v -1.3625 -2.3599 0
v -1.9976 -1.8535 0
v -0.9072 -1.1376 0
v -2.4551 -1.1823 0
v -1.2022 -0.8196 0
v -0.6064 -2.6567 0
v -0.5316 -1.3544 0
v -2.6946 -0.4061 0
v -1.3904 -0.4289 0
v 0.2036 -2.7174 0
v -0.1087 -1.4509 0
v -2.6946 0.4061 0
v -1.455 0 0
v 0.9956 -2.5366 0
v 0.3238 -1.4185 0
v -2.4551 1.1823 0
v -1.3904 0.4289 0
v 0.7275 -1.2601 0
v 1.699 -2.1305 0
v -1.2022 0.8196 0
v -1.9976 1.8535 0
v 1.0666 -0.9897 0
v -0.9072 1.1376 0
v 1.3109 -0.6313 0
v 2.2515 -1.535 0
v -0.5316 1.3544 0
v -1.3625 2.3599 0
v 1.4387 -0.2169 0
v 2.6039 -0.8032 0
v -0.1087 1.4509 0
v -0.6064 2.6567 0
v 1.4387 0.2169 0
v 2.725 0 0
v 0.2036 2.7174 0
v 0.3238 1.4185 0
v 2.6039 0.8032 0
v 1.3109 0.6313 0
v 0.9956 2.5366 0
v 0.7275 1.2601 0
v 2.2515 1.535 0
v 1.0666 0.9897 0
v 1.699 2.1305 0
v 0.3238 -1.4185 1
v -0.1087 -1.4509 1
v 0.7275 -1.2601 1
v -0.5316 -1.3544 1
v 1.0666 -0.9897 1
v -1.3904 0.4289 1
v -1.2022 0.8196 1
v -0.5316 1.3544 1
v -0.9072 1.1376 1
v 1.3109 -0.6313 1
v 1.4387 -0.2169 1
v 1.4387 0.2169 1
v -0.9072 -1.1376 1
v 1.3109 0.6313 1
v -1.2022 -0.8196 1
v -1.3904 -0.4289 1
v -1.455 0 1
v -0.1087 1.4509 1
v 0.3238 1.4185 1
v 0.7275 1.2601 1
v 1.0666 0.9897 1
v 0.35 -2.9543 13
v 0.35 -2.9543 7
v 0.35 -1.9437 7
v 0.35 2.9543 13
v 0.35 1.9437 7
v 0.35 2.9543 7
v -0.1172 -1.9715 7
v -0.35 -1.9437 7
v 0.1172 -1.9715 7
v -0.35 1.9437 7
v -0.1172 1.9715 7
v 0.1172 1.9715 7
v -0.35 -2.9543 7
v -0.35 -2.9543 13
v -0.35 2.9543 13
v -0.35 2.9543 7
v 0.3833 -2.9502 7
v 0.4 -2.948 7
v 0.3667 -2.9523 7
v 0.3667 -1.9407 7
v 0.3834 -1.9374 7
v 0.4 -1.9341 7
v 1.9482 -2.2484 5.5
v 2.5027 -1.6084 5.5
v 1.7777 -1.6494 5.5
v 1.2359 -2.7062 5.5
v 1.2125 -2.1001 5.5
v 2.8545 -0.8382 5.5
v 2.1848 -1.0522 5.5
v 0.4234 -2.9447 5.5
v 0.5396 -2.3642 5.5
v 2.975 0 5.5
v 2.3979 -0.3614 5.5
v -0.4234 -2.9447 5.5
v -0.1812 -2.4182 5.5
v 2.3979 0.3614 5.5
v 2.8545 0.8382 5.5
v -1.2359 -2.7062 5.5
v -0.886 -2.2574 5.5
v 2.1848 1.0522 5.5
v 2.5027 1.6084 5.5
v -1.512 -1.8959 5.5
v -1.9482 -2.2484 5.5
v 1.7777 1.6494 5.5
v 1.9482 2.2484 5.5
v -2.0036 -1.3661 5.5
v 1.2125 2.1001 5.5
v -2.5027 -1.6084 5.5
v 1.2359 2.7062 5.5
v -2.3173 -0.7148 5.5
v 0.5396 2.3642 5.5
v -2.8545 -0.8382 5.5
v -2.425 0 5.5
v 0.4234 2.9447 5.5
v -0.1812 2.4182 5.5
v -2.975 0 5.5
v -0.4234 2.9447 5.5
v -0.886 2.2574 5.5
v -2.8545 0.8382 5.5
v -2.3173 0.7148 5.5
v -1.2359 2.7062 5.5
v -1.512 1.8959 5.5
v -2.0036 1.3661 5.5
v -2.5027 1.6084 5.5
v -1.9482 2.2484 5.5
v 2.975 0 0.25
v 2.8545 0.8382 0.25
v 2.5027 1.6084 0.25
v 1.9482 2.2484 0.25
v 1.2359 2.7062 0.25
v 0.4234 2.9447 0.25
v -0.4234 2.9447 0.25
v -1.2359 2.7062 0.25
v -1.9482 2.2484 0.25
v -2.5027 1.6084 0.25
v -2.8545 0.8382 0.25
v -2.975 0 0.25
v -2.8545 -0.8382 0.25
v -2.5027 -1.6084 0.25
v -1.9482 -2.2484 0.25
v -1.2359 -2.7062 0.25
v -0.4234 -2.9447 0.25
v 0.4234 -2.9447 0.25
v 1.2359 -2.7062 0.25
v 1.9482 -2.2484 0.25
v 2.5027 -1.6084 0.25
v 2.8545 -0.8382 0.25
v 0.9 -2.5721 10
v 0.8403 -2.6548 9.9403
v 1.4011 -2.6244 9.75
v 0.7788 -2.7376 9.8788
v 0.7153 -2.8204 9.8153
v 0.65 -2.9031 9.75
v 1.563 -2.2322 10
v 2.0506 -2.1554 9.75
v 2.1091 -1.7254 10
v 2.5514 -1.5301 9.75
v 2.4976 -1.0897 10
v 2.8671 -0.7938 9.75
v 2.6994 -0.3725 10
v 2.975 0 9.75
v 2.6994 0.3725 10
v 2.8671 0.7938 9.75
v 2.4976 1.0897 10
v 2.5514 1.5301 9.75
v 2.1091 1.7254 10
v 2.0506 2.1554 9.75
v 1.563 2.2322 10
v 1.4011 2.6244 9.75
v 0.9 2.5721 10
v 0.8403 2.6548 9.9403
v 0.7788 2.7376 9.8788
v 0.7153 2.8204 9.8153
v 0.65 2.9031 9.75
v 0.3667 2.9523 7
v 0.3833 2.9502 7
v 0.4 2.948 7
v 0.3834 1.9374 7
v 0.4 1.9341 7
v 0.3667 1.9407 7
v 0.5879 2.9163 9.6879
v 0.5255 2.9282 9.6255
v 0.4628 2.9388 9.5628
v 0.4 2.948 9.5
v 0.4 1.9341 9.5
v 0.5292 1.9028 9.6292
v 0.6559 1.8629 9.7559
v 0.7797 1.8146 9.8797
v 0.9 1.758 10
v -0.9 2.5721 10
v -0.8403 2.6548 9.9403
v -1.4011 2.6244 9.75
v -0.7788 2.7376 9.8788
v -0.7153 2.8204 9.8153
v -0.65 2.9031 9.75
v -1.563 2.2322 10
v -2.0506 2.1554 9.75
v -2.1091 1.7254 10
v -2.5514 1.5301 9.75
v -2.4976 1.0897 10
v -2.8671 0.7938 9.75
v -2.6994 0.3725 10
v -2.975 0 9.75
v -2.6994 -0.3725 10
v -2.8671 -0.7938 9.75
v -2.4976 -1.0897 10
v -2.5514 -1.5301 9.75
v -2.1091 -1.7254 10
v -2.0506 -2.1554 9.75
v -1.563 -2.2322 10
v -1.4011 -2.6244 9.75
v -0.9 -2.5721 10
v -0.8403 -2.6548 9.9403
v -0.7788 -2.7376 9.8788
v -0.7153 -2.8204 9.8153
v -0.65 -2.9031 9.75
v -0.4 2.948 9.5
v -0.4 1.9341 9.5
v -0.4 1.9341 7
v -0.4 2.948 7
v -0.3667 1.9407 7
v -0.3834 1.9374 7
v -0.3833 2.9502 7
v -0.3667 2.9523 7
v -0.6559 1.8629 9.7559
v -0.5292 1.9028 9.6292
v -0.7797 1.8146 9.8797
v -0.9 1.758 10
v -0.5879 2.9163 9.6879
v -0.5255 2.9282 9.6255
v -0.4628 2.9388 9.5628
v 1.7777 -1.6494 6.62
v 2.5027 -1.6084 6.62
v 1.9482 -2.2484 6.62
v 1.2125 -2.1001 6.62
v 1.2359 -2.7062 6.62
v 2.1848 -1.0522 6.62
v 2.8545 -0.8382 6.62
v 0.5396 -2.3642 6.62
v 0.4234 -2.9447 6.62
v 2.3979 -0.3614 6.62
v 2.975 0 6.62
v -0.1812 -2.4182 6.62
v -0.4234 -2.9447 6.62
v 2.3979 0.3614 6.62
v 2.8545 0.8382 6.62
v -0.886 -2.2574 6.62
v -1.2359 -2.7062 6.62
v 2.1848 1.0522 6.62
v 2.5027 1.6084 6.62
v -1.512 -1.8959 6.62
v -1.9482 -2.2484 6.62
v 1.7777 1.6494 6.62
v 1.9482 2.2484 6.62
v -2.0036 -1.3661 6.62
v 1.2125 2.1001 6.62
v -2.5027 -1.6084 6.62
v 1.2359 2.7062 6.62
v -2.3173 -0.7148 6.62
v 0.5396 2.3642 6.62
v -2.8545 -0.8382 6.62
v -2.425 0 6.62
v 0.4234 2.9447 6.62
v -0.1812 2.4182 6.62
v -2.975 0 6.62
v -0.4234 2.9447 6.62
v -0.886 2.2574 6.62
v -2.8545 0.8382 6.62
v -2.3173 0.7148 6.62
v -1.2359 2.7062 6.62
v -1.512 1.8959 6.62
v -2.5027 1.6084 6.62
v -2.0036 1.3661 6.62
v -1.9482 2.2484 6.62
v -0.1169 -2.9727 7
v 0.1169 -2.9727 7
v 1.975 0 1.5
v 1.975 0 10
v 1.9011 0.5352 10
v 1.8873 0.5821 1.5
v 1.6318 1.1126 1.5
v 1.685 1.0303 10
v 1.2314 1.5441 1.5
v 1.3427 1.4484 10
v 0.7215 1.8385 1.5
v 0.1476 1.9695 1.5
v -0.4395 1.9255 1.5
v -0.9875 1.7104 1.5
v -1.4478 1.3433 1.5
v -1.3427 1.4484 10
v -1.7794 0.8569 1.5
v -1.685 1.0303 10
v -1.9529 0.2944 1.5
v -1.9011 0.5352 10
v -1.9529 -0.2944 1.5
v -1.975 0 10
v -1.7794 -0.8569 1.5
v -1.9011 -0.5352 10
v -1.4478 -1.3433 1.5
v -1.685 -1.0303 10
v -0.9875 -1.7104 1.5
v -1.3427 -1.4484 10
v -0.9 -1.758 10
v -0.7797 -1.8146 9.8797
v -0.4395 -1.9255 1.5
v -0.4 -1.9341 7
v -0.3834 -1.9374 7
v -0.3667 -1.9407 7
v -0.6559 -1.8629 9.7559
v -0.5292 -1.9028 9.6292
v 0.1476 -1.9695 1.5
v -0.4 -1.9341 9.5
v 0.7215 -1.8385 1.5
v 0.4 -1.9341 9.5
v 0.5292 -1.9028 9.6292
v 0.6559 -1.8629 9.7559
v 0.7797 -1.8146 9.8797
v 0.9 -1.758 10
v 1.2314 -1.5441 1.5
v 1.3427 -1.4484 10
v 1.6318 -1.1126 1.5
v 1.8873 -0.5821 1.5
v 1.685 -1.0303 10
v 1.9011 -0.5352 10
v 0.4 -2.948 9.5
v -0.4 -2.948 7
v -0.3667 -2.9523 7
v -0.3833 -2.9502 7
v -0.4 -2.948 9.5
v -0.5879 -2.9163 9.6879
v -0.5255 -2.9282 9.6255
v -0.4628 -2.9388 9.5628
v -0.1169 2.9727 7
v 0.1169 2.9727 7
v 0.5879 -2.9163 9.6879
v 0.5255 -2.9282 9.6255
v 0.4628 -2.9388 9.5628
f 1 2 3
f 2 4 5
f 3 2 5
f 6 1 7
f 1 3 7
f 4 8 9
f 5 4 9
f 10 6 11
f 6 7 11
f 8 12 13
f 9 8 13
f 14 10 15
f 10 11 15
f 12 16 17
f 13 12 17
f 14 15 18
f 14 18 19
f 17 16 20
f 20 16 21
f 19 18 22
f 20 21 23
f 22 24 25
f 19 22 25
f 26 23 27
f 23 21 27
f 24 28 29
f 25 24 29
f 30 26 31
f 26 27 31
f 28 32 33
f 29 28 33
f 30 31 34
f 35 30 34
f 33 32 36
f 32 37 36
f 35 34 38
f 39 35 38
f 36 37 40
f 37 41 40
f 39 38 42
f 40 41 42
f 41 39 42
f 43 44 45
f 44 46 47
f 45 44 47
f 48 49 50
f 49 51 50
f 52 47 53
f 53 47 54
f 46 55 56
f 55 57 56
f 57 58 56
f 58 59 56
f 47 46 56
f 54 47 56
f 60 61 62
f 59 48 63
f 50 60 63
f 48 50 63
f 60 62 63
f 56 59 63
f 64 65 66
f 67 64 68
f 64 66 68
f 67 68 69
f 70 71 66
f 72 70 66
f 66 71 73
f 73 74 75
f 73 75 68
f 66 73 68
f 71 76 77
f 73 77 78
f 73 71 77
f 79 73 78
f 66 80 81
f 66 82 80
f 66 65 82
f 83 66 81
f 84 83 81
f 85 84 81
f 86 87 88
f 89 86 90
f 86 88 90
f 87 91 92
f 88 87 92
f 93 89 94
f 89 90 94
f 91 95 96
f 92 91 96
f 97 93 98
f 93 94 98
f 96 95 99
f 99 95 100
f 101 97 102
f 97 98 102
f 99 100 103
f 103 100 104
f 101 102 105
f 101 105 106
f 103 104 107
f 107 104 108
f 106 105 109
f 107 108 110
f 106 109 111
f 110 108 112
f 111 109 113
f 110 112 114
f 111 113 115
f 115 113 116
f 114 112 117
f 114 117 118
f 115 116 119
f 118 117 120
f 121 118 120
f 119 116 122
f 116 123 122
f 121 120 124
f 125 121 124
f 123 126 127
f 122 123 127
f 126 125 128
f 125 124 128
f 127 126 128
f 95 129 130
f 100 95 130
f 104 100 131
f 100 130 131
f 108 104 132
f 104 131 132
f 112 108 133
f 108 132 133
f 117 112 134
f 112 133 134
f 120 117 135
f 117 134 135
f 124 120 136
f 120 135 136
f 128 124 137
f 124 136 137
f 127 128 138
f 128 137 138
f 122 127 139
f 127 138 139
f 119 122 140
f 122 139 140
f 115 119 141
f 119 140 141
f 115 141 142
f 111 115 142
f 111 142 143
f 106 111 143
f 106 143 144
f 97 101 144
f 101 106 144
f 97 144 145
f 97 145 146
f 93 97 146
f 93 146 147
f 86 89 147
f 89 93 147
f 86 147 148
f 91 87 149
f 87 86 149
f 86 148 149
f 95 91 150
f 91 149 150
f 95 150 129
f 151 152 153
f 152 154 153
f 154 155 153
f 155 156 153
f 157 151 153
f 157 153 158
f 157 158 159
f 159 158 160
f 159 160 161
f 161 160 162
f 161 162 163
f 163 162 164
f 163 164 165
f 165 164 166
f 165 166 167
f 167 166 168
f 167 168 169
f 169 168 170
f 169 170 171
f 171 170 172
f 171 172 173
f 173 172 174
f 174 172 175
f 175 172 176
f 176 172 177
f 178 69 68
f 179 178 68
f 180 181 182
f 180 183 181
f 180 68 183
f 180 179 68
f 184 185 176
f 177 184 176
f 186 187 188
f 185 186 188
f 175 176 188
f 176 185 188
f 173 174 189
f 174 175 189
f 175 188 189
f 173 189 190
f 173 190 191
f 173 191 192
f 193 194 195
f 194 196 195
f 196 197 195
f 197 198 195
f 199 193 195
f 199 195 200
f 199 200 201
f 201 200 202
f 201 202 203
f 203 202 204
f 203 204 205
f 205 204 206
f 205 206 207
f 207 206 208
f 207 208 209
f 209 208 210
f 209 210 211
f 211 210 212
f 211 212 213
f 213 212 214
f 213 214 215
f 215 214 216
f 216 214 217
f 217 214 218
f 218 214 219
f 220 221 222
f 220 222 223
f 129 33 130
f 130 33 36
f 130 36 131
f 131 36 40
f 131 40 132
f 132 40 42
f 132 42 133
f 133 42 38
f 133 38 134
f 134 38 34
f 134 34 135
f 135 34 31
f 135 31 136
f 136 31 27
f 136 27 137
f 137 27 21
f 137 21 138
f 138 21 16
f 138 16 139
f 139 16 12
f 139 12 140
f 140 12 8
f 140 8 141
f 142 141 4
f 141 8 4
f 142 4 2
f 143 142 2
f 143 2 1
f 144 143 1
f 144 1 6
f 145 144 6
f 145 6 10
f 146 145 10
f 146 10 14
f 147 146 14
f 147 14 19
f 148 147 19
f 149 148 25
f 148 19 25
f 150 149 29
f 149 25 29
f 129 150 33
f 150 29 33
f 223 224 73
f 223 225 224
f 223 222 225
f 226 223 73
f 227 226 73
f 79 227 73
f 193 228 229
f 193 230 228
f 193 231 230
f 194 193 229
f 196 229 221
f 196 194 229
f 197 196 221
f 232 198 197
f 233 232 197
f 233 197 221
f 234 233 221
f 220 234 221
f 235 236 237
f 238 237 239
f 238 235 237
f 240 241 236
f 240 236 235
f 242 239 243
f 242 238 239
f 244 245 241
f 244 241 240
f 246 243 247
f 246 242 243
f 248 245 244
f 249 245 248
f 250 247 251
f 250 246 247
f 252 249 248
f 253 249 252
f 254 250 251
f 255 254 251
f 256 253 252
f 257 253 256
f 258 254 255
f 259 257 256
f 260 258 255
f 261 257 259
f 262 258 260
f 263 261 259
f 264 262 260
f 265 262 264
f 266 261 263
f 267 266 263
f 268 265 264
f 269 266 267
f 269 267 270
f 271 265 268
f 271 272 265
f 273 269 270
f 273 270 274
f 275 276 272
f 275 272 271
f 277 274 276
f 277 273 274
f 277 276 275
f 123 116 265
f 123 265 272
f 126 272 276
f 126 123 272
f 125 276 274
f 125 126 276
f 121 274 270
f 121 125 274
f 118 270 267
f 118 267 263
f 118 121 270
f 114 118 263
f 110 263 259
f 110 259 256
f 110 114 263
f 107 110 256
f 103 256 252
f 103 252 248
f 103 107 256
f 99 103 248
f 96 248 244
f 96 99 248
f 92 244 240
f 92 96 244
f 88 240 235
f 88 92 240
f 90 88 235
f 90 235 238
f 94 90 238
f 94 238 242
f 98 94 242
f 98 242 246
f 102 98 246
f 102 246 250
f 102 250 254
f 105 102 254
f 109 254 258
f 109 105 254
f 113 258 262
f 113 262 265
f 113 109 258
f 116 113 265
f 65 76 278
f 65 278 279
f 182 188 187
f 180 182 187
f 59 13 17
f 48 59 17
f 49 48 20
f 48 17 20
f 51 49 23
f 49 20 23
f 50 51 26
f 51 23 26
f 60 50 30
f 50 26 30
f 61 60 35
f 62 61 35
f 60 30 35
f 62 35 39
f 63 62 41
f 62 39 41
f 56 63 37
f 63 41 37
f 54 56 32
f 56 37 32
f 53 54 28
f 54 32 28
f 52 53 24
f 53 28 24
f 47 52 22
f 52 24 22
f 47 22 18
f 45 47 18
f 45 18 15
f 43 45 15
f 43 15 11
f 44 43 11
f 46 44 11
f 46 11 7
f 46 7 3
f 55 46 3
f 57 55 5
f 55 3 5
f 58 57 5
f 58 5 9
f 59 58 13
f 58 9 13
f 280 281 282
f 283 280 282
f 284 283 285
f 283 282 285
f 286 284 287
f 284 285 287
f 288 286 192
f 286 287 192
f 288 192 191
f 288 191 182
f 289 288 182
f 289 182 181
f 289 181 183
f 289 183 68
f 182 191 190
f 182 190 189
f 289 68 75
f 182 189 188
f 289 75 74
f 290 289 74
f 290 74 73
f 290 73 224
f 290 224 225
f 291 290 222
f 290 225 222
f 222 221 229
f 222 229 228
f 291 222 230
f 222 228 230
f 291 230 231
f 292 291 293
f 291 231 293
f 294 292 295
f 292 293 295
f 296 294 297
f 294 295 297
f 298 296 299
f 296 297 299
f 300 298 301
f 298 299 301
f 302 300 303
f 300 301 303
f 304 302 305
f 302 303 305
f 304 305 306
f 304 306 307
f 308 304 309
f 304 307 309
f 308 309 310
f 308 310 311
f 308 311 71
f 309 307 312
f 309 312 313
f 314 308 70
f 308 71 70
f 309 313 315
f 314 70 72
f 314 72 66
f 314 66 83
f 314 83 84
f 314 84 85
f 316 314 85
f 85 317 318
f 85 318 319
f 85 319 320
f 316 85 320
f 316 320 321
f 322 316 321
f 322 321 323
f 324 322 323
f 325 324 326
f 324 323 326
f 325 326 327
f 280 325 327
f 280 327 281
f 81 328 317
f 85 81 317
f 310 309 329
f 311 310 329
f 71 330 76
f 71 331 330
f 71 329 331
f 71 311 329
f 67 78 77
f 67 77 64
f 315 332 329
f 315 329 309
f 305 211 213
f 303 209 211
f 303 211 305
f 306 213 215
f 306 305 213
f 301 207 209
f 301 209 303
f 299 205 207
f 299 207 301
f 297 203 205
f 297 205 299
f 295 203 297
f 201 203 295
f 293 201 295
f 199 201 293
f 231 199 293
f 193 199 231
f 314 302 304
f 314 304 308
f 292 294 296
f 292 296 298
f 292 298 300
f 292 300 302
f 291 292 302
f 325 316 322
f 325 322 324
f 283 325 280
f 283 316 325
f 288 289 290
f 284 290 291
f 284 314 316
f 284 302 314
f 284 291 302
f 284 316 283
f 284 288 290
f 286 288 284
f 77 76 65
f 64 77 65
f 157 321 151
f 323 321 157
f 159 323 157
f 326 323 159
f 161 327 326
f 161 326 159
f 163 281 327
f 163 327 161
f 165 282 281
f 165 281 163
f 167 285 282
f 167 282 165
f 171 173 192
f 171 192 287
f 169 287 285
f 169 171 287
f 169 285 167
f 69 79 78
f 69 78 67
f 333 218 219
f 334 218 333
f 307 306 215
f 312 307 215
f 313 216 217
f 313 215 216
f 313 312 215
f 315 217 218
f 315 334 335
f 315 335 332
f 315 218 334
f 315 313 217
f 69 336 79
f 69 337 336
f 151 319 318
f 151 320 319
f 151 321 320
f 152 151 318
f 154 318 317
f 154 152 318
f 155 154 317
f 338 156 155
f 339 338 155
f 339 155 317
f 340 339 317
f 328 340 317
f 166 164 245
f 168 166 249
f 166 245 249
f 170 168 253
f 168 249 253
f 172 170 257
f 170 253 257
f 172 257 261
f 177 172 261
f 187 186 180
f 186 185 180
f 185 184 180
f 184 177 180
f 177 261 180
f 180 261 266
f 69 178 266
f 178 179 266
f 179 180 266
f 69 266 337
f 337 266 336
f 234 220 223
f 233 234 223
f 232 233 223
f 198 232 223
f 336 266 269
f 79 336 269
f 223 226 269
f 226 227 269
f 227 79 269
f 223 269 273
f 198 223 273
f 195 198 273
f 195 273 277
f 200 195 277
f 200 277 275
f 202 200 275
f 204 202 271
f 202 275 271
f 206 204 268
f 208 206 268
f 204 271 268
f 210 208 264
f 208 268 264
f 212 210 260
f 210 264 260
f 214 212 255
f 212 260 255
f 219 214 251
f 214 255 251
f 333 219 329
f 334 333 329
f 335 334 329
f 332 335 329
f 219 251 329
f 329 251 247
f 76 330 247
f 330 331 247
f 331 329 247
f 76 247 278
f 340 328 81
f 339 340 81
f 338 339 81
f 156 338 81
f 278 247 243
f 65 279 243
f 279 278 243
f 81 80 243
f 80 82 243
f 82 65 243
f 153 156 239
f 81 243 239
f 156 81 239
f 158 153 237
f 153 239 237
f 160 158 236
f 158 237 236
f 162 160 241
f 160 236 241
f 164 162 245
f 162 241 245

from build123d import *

# Parameters (mm, degrees)
ESBO_O1_R                = 2.975
RESSALTO_EXTRUS_O1_DEPTH = 10
ESBO_O2_R                = 4.073112834
ESBO_O2_R_2              = 2.425
CORTE_EXTRUS_O1_DEPTH    = 1.12
ESBO_O3_R                = 1.455
CORTE_EXTRUS_O2_DEPTH    = 1
ESBO_O4_R                = 1.975
CORTE_EXTRUS_O3_DEPTH    = 9
RESSALTO_EXTRUS_O2_START = 0.5
ESBO_O5_R                = 1.975
RESSALTO_EXTRUS_O2_DEPTH = 0.5
CHANFRO1_SIZE            = 0.25
ESBO_O6_W                = 0.8
ESBO_O6_H                = 6.683609012
CORTE_EXTRUS_O4_DEPTH    = 3
CHANFRO2_SIZE            = 0.5
ESBO_O7_W                = 0.7
ESBO_O7_H                = 5.908680056
RESSALTO_EXTRUS_O3_DEPTH = 6


with BuildPart() as part:
    # Esboço1 → Ressalto-extrusão1 (new body)
    with BuildSketch(Plane.XY):
        Circle(ESBO_O1_R)
    extrude(amount=RESSALTO_EXTRUS_O1_DEPTH)

    # Esboço2 → Corte-extrusão1 (cut)
    with BuildSketch(Plane(origin=(0, 0, 5.5), x_dir=(-1, 0, 0), z_dir=(0, 0, -1))):
        Circle(ESBO_O2_R)
        Circle(ESBO_O2_R_2, mode=Mode.SUBTRACT)
    extrude(amount=-CORTE_EXTRUS_O1_DEPTH, mode=Mode.SUBTRACT)

    # Esboço3 → Corte-extrusão2 (cut)
    with BuildSketch(Plane(origin=(0, 0, 0), x_dir=(-1, 0, 0), z_dir=(0, 0, -1))):
        Circle(ESBO_O3_R)
    extrude(amount=-CORTE_EXTRUS_O2_DEPTH, mode=Mode.SUBTRACT)

    # Esboço4 → Corte-extrusão3 (cut)
    with BuildSketch(Plane.XY.offset(10)):
        Circle(ESBO_O4_R)
    extrude(amount=-CORTE_EXTRUS_O3_DEPTH, mode=Mode.SUBTRACT)

    # Esboço5 → Ressalto-extrusão2 (add)
    with BuildSketch(Plane.XY.offset(1).offset(RESSALTO_EXTRUS_O2_START)):
        Circle(ESBO_O5_R)
    extrude(amount=-RESSALTO_EXTRUS_O2_DEPTH)

    # Chanfro1
    chanfro1_edges = [part.edges().sort_by_distance(p)[0] for p in [
        (-2.975, 0, 0),
        (-2.975, 0, 10),
    ]]
    chamfer(chanfro1_edges, length=CHANFRO1_SIZE)

    # Esboço6 → Corte-extrusão4 (cut)
    with BuildSketch(Plane.XY.offset(10)):
        Rectangle(ESBO_O6_W, ESBO_O6_H)
    extrude(amount=-CORTE_EXTRUS_O4_DEPTH, mode=Mode.SUBTRACT)

    # Chanfro2
    # the kernel refuses this chamfer: 0.5 mm, written as the material it takes off along each edge
    with BuildSketch(Plane(origin=(0.4, 0.64822805, 10), x_dir=(-0.027495876610586403, 0, -0.9996219169112968), z_dir=(0, 1, 0))) as chanfro2_piece_1:
        Polygon((CHANFRO2_SIZE * 0.999621916911, -CHANFRO2_SIZE * 0.0274958766106), (-CHANFRO2_SIZE * 0.0274958766106, -CHANFRO2_SIZE * 0.999621916911), (0, 0), align=None)
    extrude(amount=3.333095776, mode=Mode.SUBTRACT)
    with BuildSketch(Plane(origin=(0.4, -3.981323826, 10), x_dir=(0.9996219169112968, 0, 0.027495876610585633), z_dir=(0, 1, 0)), Plane(origin=(-0.4, -0.64822805, 10), x_dir=(-0.9996219169112968, 0, 0.027495876610585623), z_dir=(0, -1, 0)), Plane(origin=(-0.4, 3.981323826, 10), x_dir=(-0.9996219169112968, 0, 0.027495876610585623), z_dir=(0, -1, 0))) as chanfro2_piece_2:
        Polygon((CHANFRO2_SIZE * 0.999621916911, CHANFRO2_SIZE * 0.0274958766106), (-CHANFRO2_SIZE * 0.0274958766106, CHANFRO2_SIZE * 0.999621916911), (0, 0), align=None)
    extrude(amount=3.333095776, mode=Mode.SUBTRACT)

    # Esboço7 → Ressalto-extrusão3 (add)
    with BuildSketch(Plane.XY.offset(7)):
        Rectangle(ESBO_O7_W, ESBO_O7_H)
    extrude(amount=RESSALTO_EXTRUS_O3_DEPTH)


solid = part.part
